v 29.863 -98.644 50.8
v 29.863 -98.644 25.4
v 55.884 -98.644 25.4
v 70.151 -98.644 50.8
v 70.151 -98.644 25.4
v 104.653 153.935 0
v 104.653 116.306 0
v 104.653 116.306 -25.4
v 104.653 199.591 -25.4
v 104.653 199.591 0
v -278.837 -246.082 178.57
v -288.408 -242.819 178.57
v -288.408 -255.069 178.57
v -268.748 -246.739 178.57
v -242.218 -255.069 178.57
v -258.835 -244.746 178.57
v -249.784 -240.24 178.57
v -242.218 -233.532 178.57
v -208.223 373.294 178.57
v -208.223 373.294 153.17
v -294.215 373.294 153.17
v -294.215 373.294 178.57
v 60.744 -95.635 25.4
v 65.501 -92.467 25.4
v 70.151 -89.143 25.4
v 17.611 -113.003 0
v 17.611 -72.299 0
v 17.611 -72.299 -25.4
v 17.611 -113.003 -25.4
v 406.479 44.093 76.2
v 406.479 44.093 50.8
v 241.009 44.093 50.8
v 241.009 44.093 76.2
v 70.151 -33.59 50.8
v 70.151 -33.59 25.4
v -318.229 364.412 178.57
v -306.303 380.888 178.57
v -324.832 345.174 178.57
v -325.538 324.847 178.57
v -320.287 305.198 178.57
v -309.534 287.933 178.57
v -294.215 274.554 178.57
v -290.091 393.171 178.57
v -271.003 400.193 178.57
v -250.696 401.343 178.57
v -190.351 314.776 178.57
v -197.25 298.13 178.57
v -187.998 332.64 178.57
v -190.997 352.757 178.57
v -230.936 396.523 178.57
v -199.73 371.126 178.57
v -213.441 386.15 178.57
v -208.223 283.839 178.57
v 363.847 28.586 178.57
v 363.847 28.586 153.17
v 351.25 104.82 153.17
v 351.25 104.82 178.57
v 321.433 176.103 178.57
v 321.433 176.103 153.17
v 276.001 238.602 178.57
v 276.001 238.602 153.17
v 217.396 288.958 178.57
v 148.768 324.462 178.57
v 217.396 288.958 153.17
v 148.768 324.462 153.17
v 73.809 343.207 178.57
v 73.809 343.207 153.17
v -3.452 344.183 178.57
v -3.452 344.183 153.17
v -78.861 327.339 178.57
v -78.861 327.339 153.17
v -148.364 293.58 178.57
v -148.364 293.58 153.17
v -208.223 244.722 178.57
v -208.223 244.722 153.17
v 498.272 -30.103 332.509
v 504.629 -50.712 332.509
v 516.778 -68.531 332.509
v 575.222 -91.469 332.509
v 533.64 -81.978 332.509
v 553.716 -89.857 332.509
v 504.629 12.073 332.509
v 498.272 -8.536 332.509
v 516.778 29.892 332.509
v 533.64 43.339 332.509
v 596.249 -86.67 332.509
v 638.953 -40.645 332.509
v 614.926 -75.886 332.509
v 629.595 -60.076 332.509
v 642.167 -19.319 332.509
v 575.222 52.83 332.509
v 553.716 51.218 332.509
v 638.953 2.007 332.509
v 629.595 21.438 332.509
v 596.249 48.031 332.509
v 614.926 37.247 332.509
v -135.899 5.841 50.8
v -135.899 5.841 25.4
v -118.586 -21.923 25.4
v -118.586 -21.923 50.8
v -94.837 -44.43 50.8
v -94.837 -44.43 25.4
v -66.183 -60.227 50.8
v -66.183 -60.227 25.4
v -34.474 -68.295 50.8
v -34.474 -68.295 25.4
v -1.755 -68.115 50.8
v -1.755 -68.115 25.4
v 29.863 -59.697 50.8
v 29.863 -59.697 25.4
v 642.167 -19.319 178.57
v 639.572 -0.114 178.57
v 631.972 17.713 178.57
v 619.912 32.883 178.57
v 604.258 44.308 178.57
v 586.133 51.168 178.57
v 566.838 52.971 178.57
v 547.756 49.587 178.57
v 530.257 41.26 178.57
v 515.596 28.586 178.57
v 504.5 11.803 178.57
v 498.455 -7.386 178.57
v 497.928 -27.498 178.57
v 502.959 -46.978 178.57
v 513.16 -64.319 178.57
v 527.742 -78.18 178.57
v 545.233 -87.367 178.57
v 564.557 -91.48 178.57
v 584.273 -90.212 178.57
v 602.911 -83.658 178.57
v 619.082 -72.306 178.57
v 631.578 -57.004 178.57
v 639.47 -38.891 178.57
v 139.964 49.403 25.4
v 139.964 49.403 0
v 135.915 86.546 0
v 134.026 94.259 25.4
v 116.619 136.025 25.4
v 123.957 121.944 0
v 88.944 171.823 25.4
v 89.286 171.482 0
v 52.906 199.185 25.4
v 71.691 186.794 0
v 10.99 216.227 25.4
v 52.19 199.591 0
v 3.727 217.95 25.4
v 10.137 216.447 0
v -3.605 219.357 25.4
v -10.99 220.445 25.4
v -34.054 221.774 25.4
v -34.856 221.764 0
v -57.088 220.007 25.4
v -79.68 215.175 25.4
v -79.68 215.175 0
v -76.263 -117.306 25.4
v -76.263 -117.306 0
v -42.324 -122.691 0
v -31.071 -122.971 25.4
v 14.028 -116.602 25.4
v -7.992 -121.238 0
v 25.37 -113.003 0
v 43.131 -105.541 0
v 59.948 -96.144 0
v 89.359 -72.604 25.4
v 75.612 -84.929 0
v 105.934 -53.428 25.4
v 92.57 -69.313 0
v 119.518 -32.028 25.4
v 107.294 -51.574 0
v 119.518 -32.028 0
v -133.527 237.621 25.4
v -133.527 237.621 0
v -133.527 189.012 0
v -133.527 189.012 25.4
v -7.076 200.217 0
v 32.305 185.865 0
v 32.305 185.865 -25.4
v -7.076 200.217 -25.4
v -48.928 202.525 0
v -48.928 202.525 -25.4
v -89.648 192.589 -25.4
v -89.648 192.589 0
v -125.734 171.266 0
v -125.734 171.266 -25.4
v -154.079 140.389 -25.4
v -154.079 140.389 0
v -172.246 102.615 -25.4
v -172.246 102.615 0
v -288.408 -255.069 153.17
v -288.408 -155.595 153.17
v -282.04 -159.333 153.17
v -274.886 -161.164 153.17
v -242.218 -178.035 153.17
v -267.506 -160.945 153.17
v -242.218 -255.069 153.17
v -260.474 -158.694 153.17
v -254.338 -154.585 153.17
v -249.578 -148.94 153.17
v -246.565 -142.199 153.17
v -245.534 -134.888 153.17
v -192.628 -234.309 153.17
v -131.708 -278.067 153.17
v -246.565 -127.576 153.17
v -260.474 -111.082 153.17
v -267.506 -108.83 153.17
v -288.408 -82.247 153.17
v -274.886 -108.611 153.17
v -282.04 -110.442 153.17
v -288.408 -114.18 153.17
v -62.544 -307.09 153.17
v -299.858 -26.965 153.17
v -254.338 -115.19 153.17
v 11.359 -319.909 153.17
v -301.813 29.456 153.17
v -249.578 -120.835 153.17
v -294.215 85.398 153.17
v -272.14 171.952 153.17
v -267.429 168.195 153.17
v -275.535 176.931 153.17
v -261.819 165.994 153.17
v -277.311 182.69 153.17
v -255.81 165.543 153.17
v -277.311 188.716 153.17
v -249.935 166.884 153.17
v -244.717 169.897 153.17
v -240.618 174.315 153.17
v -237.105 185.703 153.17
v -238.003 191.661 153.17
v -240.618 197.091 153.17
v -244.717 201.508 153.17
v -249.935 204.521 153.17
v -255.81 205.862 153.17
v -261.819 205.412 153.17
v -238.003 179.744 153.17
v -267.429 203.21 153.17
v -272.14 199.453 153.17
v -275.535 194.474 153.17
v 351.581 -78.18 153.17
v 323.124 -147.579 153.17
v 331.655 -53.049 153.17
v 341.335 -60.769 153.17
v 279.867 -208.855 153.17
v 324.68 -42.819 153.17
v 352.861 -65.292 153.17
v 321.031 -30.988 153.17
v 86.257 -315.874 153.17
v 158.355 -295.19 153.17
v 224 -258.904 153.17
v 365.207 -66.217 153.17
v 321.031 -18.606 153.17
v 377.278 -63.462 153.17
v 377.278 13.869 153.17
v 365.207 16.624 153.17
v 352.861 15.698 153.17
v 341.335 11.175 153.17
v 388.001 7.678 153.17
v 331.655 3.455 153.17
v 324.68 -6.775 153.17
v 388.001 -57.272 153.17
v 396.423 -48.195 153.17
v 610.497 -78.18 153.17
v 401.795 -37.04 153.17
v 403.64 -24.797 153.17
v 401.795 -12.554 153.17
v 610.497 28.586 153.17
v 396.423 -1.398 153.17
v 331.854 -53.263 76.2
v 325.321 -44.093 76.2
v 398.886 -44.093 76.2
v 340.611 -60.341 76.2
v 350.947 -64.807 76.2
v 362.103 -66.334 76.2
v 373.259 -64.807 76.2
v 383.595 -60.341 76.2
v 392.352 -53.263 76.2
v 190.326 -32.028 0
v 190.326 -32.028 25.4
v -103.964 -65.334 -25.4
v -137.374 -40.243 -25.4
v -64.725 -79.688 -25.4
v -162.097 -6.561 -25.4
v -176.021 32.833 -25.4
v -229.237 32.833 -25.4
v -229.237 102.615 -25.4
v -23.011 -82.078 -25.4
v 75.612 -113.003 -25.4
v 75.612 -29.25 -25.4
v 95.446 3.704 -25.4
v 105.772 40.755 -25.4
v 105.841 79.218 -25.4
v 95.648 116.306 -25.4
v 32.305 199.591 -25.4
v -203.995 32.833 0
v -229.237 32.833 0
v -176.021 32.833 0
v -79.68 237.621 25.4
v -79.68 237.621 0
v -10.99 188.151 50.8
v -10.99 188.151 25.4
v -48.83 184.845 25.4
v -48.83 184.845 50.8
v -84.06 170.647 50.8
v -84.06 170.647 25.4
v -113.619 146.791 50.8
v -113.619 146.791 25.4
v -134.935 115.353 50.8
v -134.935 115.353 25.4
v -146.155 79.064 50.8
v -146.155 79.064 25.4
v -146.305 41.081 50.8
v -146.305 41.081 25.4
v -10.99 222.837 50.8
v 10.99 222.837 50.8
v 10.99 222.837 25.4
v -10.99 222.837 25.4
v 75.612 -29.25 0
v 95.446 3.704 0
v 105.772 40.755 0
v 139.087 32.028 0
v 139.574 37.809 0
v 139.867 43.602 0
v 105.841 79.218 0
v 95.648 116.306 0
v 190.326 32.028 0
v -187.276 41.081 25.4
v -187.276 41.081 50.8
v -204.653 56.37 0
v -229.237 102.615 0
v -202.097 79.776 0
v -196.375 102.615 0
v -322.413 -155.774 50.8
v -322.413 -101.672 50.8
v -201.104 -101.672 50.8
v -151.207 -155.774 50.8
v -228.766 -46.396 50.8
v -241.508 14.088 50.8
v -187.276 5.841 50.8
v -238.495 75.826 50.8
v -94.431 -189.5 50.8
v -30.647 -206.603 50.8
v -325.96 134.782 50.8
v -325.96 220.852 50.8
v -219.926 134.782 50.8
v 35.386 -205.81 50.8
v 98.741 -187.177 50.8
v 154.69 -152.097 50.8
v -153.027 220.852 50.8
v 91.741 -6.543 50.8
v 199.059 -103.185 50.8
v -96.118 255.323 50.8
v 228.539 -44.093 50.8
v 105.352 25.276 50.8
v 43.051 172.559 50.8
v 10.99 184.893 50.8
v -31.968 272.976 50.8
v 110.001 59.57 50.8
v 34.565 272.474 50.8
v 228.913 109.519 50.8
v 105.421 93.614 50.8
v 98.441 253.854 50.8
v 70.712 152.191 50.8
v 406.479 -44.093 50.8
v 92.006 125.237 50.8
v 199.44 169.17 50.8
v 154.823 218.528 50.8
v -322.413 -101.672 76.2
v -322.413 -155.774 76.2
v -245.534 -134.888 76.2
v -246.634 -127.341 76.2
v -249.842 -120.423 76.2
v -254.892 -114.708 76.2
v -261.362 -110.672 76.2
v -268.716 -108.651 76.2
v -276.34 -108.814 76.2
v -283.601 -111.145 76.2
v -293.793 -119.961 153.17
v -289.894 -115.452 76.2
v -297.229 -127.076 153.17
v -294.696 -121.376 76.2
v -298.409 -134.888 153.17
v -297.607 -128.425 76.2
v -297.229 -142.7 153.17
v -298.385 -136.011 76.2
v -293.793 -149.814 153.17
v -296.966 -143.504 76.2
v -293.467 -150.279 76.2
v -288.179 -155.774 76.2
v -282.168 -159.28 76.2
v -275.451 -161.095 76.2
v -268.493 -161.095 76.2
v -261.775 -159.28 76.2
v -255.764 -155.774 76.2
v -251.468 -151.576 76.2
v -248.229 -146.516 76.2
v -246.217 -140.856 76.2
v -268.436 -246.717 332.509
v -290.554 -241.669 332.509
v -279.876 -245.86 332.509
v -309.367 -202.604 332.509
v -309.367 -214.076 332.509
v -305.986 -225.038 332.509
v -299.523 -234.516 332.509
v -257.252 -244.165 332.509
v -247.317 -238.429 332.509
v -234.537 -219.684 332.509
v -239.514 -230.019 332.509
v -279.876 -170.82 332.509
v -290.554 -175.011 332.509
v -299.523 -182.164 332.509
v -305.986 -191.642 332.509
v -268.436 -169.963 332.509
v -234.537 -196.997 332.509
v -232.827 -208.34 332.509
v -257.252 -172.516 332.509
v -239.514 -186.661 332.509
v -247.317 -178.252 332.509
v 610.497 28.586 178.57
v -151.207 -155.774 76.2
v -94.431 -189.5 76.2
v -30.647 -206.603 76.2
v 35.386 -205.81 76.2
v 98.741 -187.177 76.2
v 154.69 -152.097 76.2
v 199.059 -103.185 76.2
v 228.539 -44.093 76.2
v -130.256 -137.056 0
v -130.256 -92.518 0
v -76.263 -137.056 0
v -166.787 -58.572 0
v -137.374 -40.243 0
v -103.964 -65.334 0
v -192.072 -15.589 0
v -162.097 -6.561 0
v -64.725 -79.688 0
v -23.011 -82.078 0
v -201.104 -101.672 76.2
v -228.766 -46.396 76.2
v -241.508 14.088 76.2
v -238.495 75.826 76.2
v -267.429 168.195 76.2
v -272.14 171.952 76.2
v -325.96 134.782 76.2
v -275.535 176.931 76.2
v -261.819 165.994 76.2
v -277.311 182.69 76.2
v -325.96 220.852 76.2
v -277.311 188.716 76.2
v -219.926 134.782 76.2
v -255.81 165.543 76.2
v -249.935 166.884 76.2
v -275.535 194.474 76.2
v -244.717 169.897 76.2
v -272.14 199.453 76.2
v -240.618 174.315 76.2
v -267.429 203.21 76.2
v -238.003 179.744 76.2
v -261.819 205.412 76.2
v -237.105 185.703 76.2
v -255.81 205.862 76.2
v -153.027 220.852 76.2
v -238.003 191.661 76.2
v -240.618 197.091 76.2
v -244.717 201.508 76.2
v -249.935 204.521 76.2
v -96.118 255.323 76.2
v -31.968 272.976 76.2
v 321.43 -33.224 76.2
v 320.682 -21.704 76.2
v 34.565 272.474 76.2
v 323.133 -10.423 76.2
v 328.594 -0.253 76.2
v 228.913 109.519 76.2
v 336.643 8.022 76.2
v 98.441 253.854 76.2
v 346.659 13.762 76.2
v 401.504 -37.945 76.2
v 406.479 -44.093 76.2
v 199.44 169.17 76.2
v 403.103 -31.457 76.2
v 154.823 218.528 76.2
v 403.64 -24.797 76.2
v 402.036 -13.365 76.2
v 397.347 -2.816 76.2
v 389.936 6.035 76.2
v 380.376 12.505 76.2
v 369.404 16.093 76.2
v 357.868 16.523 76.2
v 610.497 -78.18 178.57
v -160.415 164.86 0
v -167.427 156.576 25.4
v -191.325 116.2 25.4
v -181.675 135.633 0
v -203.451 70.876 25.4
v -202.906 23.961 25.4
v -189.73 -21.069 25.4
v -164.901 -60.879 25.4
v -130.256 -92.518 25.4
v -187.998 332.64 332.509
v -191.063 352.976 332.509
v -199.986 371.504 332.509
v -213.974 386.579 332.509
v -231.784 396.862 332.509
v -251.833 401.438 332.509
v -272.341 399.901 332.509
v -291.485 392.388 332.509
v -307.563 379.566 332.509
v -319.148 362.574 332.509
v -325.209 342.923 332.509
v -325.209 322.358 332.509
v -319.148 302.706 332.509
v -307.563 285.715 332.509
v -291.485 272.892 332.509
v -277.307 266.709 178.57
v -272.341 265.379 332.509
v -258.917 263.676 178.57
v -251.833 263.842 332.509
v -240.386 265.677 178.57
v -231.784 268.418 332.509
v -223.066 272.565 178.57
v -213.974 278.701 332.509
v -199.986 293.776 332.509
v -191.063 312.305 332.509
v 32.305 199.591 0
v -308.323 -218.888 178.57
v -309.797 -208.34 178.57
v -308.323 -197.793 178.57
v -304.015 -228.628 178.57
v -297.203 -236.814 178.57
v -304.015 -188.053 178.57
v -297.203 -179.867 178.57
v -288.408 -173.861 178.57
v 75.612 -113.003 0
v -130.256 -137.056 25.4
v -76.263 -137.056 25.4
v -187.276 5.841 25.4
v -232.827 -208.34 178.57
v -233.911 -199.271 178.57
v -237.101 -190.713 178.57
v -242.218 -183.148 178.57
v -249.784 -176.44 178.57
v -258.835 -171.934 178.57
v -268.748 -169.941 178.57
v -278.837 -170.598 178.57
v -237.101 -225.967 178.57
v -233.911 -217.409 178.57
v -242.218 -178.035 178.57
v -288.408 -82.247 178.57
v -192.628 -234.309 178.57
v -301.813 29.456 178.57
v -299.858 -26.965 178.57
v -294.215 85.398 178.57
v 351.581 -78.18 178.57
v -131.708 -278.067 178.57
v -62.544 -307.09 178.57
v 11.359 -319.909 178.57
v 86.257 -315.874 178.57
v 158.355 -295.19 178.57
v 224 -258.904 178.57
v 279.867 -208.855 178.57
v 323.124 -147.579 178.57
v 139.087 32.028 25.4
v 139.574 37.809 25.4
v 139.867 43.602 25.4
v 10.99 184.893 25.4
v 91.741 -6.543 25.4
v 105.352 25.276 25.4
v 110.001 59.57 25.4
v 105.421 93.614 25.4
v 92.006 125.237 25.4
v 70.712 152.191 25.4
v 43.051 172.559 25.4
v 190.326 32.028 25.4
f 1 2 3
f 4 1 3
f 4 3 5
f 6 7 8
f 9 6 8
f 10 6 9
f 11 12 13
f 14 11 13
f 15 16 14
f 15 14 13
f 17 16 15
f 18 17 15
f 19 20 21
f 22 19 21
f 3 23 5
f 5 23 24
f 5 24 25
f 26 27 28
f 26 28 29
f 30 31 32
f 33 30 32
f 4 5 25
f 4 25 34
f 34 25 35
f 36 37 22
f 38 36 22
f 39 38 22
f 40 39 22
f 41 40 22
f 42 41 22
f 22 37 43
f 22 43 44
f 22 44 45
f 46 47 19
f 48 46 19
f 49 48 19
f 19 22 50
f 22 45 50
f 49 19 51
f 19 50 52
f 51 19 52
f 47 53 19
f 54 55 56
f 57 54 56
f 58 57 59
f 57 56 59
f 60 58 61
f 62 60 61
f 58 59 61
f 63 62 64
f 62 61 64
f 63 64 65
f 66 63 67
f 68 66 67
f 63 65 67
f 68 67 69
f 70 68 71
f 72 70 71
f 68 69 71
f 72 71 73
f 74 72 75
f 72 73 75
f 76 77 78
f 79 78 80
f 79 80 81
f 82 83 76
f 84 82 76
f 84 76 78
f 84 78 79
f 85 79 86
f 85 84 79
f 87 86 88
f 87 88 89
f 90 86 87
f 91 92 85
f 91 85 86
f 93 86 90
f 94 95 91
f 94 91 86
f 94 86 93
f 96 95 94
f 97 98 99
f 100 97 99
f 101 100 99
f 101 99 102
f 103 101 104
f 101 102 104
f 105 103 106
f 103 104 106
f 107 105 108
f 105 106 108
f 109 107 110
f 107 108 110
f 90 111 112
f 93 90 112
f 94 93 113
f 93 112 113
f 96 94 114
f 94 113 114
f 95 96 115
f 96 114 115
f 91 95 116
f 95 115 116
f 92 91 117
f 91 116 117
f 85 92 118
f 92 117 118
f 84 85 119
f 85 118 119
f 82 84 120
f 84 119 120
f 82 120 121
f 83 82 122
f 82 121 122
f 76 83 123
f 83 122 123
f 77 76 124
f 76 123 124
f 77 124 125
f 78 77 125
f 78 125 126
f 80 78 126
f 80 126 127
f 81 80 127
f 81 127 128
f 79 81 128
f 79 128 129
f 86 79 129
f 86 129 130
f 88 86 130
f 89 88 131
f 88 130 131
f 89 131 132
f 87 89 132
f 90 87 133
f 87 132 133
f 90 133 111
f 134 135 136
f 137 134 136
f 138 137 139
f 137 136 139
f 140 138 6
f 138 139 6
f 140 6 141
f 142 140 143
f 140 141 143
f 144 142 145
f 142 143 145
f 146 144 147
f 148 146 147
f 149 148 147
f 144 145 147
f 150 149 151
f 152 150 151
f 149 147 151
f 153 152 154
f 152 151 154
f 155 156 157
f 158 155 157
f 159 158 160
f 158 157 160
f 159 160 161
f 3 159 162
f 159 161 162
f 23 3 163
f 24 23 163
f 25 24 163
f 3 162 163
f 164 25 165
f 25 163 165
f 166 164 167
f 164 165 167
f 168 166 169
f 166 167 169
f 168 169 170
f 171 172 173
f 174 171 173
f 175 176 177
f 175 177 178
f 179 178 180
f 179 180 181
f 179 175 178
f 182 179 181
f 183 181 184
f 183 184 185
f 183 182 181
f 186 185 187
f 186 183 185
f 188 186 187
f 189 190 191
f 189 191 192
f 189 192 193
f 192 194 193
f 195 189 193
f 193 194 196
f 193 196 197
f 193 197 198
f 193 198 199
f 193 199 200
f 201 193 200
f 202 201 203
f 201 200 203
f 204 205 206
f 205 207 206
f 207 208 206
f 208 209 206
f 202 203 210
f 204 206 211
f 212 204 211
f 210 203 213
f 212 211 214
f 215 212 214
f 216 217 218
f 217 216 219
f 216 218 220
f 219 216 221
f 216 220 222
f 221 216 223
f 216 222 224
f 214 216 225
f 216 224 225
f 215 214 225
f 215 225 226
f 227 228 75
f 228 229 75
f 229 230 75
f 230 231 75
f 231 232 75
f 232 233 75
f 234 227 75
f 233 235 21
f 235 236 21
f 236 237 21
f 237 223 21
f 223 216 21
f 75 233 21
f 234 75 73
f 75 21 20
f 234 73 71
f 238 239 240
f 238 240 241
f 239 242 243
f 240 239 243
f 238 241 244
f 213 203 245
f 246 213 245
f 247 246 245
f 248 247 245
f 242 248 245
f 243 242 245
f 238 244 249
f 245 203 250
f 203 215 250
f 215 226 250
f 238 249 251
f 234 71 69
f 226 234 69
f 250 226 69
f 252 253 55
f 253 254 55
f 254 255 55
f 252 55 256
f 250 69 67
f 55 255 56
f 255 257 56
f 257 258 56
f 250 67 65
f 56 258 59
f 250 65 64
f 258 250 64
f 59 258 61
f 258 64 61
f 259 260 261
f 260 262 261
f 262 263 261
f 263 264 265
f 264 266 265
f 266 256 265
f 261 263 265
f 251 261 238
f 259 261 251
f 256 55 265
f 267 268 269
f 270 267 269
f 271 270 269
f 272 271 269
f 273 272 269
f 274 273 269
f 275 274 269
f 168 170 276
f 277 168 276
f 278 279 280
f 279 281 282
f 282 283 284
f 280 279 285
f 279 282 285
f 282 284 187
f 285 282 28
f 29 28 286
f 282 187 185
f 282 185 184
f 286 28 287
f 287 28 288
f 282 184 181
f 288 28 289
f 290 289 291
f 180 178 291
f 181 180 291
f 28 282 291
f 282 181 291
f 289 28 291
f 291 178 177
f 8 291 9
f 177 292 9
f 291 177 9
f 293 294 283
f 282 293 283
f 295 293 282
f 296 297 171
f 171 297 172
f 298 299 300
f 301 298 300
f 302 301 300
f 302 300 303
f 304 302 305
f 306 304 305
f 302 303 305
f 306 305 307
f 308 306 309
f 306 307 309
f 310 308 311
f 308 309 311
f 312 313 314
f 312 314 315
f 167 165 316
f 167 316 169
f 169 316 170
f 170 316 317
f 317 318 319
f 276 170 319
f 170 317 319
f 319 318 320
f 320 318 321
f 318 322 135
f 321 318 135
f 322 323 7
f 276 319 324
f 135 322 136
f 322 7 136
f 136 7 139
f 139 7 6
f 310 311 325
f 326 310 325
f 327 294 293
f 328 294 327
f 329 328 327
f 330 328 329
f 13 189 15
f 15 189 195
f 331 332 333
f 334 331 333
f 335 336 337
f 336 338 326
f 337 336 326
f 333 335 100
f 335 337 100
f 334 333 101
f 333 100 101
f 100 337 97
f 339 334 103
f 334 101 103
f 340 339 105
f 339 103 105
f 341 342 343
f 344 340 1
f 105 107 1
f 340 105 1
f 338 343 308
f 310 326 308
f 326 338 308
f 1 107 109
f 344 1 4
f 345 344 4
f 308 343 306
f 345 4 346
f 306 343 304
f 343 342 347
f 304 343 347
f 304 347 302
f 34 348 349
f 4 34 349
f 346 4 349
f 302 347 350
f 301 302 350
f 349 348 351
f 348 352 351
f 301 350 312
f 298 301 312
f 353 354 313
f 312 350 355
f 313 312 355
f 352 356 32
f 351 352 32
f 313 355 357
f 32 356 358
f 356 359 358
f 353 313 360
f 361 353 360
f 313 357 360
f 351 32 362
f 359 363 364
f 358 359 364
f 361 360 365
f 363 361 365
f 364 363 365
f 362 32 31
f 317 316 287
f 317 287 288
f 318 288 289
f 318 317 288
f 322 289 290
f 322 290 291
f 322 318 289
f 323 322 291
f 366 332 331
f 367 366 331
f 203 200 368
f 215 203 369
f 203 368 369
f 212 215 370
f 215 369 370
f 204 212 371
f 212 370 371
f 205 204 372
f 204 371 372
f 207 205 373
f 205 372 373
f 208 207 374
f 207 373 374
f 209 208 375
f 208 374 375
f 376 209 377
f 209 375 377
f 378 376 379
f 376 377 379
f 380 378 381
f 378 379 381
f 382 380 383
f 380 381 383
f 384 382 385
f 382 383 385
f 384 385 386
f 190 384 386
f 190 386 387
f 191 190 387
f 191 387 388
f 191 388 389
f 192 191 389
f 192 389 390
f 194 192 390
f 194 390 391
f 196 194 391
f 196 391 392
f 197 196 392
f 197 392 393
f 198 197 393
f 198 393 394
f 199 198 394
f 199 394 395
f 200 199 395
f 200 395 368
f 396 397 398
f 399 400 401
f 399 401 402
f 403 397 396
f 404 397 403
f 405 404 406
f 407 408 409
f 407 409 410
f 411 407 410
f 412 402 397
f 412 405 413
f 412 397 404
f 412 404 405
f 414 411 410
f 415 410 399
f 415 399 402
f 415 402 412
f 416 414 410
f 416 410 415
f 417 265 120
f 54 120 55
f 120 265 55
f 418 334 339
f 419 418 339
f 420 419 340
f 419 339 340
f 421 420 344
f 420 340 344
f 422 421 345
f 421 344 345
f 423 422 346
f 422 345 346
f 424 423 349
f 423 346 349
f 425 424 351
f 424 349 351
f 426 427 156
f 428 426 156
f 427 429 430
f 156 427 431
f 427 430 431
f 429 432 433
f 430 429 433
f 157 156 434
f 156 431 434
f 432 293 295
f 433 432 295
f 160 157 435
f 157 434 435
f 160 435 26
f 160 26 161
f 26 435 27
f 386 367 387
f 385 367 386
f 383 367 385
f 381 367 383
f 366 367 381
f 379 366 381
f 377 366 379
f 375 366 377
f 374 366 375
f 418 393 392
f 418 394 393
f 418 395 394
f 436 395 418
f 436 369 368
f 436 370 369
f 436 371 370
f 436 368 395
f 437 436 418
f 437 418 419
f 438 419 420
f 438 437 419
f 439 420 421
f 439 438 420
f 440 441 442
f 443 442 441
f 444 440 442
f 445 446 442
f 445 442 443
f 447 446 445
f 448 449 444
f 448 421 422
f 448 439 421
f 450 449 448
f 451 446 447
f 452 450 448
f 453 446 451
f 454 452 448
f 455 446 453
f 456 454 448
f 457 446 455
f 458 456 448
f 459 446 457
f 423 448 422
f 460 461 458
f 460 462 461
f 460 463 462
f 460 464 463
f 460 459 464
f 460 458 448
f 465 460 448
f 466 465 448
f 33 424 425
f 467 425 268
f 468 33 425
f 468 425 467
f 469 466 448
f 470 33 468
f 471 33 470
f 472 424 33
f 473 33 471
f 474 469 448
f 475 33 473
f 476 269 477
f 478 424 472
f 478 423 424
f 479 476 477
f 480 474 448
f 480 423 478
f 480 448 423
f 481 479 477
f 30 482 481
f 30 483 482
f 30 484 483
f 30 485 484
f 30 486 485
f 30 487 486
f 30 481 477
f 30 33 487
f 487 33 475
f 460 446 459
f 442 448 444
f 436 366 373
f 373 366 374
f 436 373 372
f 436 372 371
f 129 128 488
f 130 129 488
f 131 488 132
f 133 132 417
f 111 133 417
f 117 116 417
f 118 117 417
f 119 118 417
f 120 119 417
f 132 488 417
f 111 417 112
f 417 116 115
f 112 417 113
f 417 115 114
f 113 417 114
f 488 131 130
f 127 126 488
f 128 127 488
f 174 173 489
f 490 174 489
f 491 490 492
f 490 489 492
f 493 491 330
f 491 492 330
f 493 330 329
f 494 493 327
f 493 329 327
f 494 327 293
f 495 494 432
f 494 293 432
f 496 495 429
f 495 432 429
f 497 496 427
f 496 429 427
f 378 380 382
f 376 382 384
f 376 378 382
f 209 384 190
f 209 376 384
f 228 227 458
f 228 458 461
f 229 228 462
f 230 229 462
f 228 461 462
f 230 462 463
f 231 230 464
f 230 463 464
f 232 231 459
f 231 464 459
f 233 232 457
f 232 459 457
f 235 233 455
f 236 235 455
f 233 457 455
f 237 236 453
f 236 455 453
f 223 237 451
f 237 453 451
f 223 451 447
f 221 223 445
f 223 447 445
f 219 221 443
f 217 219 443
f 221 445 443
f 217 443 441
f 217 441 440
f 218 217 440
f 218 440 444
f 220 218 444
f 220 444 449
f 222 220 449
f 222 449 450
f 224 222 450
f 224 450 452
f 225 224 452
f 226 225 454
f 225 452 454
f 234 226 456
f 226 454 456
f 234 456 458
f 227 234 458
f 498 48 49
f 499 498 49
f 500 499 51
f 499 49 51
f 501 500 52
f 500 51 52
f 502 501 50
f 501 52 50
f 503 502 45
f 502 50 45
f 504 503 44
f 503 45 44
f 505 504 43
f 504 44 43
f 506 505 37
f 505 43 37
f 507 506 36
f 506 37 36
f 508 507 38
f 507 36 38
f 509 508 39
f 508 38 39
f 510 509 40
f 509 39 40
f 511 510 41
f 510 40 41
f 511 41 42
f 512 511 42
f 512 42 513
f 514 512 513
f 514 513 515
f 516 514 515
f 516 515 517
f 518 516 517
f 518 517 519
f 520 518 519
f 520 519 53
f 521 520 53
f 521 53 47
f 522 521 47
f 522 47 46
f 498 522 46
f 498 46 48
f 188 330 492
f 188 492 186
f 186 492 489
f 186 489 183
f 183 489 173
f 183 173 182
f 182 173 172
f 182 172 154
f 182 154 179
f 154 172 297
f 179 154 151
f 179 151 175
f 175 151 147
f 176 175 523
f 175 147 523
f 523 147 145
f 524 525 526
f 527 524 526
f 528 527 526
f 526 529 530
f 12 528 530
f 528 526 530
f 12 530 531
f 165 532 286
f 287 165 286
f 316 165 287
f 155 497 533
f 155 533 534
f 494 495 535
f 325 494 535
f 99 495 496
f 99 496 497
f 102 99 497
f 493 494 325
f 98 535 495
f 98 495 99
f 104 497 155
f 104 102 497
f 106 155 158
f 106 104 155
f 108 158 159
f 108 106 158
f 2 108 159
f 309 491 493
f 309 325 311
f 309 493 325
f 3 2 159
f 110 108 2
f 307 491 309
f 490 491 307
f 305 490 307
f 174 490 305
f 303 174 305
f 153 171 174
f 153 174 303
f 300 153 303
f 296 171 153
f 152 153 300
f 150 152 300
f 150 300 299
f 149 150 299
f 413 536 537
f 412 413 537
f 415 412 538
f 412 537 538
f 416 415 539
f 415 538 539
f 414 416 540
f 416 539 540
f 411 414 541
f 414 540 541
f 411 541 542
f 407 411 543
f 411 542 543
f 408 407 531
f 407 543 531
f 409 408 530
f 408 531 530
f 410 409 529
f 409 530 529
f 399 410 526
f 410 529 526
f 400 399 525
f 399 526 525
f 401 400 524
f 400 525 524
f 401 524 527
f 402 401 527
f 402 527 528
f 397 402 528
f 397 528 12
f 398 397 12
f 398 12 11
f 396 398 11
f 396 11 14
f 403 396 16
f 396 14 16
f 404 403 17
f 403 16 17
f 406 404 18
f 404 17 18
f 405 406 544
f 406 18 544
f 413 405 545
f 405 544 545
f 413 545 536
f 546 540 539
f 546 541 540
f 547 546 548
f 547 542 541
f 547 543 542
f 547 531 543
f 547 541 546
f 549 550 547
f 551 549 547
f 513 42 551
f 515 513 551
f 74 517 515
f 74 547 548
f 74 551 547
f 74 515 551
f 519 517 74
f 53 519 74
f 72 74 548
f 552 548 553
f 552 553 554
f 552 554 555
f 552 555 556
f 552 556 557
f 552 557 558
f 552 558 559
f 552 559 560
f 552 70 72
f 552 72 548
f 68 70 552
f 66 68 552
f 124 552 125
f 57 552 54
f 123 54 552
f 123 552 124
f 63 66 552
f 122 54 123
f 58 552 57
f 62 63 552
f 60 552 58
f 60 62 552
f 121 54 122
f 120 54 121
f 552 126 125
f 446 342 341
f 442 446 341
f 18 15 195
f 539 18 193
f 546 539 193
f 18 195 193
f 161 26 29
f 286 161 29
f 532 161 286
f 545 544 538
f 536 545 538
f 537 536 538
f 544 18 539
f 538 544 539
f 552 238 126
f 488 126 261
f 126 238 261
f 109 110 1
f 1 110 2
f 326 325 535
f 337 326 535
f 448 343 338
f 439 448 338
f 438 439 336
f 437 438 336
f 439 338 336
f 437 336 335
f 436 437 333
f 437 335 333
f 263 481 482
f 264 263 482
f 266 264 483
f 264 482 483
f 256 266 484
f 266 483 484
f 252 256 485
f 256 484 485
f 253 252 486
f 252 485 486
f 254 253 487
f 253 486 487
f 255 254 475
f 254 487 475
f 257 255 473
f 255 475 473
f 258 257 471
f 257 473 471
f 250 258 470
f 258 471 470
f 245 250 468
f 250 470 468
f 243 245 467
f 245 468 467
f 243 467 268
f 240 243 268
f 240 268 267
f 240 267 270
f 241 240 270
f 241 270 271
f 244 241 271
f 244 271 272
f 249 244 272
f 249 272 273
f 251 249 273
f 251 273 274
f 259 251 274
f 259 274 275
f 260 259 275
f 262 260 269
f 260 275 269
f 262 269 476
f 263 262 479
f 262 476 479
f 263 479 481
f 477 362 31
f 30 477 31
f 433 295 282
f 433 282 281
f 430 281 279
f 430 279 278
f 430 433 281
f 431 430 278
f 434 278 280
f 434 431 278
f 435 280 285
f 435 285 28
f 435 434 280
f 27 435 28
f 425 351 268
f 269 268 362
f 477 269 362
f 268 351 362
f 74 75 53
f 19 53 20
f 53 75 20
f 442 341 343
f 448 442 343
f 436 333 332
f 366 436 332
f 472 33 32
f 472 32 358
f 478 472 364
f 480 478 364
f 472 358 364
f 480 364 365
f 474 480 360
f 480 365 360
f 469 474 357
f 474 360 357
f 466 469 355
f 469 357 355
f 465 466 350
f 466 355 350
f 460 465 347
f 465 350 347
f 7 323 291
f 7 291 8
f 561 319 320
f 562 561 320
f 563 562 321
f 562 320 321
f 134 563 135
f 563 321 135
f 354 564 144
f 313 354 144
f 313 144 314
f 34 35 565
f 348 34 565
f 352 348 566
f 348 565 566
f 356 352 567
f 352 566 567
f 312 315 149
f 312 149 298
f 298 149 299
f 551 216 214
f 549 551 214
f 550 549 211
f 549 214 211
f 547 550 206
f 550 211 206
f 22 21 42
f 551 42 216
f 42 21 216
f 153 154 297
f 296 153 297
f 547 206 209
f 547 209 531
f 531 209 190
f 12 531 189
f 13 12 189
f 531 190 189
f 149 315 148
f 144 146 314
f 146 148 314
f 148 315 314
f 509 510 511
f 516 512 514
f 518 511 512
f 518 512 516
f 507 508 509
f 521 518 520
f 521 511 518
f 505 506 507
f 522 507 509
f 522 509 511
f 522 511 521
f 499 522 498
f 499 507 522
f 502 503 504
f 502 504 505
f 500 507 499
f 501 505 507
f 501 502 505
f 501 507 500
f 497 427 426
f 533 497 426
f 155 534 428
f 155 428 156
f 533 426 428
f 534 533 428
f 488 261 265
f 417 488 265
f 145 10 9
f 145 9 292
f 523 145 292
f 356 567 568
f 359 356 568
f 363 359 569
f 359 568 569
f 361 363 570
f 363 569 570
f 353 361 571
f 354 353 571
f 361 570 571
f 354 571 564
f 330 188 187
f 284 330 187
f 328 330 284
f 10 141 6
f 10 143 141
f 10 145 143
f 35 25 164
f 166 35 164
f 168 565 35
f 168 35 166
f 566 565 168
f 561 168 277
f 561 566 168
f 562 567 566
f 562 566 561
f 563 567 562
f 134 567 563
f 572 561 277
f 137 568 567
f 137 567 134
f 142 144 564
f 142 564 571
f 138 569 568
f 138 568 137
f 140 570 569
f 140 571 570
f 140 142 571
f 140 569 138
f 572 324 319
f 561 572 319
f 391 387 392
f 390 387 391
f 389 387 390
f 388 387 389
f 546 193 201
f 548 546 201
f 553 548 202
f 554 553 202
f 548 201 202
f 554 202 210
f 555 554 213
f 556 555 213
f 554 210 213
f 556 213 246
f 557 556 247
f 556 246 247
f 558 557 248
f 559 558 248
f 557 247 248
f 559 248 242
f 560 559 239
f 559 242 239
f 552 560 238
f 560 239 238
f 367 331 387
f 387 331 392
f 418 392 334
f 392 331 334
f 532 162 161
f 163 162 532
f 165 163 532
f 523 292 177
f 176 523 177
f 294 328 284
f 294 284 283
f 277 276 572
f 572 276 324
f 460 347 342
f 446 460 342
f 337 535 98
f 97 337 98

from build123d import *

# Parameters (mm, degrees)
F1_DEPTH  = 25.4
F3_DEPTH  = 25.4
F5_DEPTH  = 25.4
F7_DEPTH  = 25.4
F8_R      = 26.4374178828
F8_R_2    = 20.2158541238
F8_R_3    = 41.5366854277
F9_DEPTH  = 76.96962
F11_DEPTH = 25.4
F12_R     = 38.48481
F12_R_2   = 68.9908119852
F12_R_3   = 72.3516487383
F13_DEPTH = 153.93924


with BuildPart() as f1:
    # F0 (on Top) → F1 (new body)
    with BuildSketch(Plane.XY):
        with BuildLine():
            ThreePointArc((139.0866722242, 32.0284068584), (139.7448851035, 40.7043758766), (139.9644758853, 49.4025057036))
            ThreePointArc((139.9644758853, 49.4025057036), (71.4291716272, 186.9925042301), (-79.6795263886, 215.1750699089))
            Line((-79.6795263886, 215.1750699089), (-79.6795263886, 172.3793298006))
            Line((-79.6795263886, 172.3793298006), (-133.5268542171, 172.3793298006))
            Line((-133.5268542171, 172.3793298006), (-133.5268542171, 189.0120366332))
            ThreePointArc((-133.526854217, 189.0120366332), (-204.7819093266, 47.399960627), (-130.2560642362, -92.5184490373))
            Line((-130.2560642362, -92.5184490373), (-130.2560642362, -78.4356147051))
            Line((-130.2560642362, -78.4356147051), (-76.262794435, -78.4356147051))
            Line((-76.262794435, -78.4356147051), (-76.262794435, -117.3063801224))
            ThreePointArc((-76.262794435, -117.3063801224), (36.4232602358, -108.6350876024), (119.518113847, -32.0284068584))
            Line((119.518113847, -32.0284068584), (75.1415789127, -32.0284068584))
            Line((75.1415789127, -32.0284068584), (75.1415789127, 32.0284068584))
            Line((75.1415789127, 32.0284068584), (139.0866722242, 32.0284068584))
        make_face()
        with BuildLine():
            Line((-79.6795263886, 172.3793298006), (-79.6795263886, 215.1750699089))
            ThreePointArc((-79.6795263886, 215.1750699089), (-107.7476794206, 204.4490783385), (-133.526854217, 189.0120366332))
            Line((-133.5268542171, 189.0120366332), (-133.5268542171, 172.3793298006))
            Line((-133.5268542171, 172.3793298006), (-79.6795263886, 172.3793298006))
        make_face()
        with BuildLine():
            ThreePointArc((-133.526854217, 189.0120366332), (-107.7476794206, 204.4490783385), (-79.6795263886, 215.1750699089))
            Line((-79.6795263886, 215.1750699089), (-79.6795263886, 237.6205772161))
            Line((-79.6795263886, 237.6205772161), (-133.5268542171, 237.6205772161))
            Line((-133.5268542171, 237.6205772161), (-133.5268542171, 189.0120366332))
        make_face()
        with BuildLine():
            Line((190.3256773949, 32.0284068584), (139.0866722242, 32.0284068584))
            ThreePointArc((139.0866722242, 32.0284068584), (132.4435362995, -0.9595801253), (119.518113847, -32.0284068584))
            Line((119.518113847, -32.0284068584), (190.3256773949, -32.0284068584))
            Line((190.3256773949, -32.0284068584), (190.3256773949, 32.0284068584))
        make_face()
        with BuildLine():
            ThreePointArc((119.518113847, -32.0284068584), (132.4435362995, -0.9595801253), (139.0866722242, 32.0284068584))
            Line((139.0866722242, 32.0284068584), (75.1415789127, 32.0284068584))
            Line((75.1415789127, 32.0284068584), (75.1415789127, -32.0284068584))
            Line((75.1415789127, -32.0284068584), (119.518113847, -32.0284068584))
        make_face()
        with BuildLine():
            Line((-130.2560642362, -78.4356147051), (-130.2560642362, -92.5184490373))
            ThreePointArc((-130.2560642362, -92.5184490373), (-104.3353903251, -107.2560814152), (-76.262794435, -117.3063801224))
            Line((-76.262794435, -117.3063801224), (-76.262794435, -78.4356147051))
            Line((-76.262794435, -78.4356147051), (-130.2560642362, -78.4356147051))
        make_face()
        with BuildLine():
            ThreePointArc((-76.262794435, -117.3063801224), (-104.3353903251, -107.2560814152), (-130.2560642362, -92.5184490373))
            Line((-130.2560642362, -92.5184490373), (-130.2560642362, -137.0555609465))
            Line((-130.2560642362, -137.0555609465), (-76.262794435, -137.0555609465))
            Line((-76.262794435, -137.0555609465), (-76.262794435, -117.3063801224))
        make_face()
    extrude(amount=F1_DEPTH)

    # F2 (on Top) → F3 (join)
    with BuildSketch(Plane.XY):
        with BuildLine():
            ThreePointArc((75.6118036807, -29.2504710738), (99.0030626057, 12.8049370358), (107.1065195267, 60.2406022181))
            ThreePointArc((107.1065195267, 60.2406022181), (104.2125651571, 88.852840411), (95.6479245708, 116.3061112165))
            Line((95.6479245708, 116.3061112165), (32.3053076863, 116.3061112165))
            Line((32.3053076863, 116.3061112165), (32.3053076863, 185.8650083866))
            ThreePointArc((32.3053076863, 185.8650083866), (-89.6480521885, 192.5894553657), (-172.2460990224, 102.6149988174))
            Line((-172.2460990224, 102.6149988174), (-127.7187615633, 102.6149988174))
            Line((-127.7187615633, 102.6149988174), (-127.7187615633, 32.8334420919))
            Line((-127.7187615633, 32.8334420919), (-176.0207239306, 32.8334420919))
            ThreePointArc((-176.0207239306, 32.8334420919), (-103.9642758165, -65.3340546547), (17.6107399166, -72.2985849202))
            Line((17.6107399166, -72.2985849202), (17.6107399166, 0))
            Line((17.6107399166, 0), (75.6118036807, 0))
            Line((75.6118036807, 0), (75.6118036807, -29.2504710738))
        make_face()
        with BuildLine():
            Line((32.3053076863, 116.3061112165), (95.6479245708, 116.3061112165))
            ThreePointArc((95.6479245708, 116.3061112165), (69.8653962579, 156.4480764432), (32.3053076863, 185.8650083866))
            Line((32.3053076863, 185.8650083866), (32.3053076863, 116.3061112165))
        make_face()
        with BuildLine():
            ThreePointArc((32.3053076863, 185.8650083866), (69.8653962579, 156.4480764432), (95.6479245708, 116.3061112165))
            Line((95.6479245708, 116.3061112165), (104.6530529857, 116.3061112165))
            Line((104.6530529857, 116.3061112165), (104.6530529857, 199.5911747217))
            Line((104.6530529857, 199.5911747217), (32.3053076863, 199.5911747217))
            Line((32.3053076863, 199.5911747217), (32.3053076863, 185.8650083866))
        make_face()
        with BuildLine():
            Line((75.6118036807, -113.002628088), (75.6118036807, -29.2504710738))
            ThreePointArc((75.6118036807, -29.2504710738), (49.3762482748, -54.4999311), (17.6107399166, -72.2985849202))
            Line((17.6107399166, -72.2985849202), (17.6107399166, -113.002628088))
            Line((17.6107399166, -113.002628088), (75.6118036807, -113.002628088))
        make_face()
        with BuildLine():
            ThreePointArc((17.6107399166, -72.2985849202), (49.3762482748, -54.4999311), (75.6118036807, -29.2504710738))
            Line((75.6118036807, -29.2504710738), (75.6118036807, 0))
            Line((75.6118036807, 0), (17.6107399166, 0))
            Line((17.6107399166, 0), (17.6107399166, -72.2985849202))
        make_face()
        with BuildLine():
            Line((-127.7187615633, 102.6149988174), (-172.2460990224, 102.6149988174))
            ThreePointArc((-172.2460990224, 102.6149988174), (-178.4651931082, 67.9585352452), (-176.0207239306, 32.8334420919))
            Line((-176.0207239306, 32.8334420919), (-127.7187615633, 32.8334420919))
            Line((-127.7187615633, 32.8334420919), (-127.7187615633, 102.6149988174))
        make_face()
        with BuildLine():
            ThreePointArc((-176.0207239306, 32.8334420919), (-178.4651931082, 67.9585352452), (-172.2460990224, 102.6149988174))
            Line((-172.2460990224, 102.6149988174), (-229.236587882, 102.6149988174))
            Line((-229.236587882, 102.6149988174), (-229.236587882, 32.8334420919))
            Line((-229.236587882, 32.8334420919), (-176.0207239306, 32.8334420919))
        make_face()
    extrude(amount=-F3_DEPTH)

    # F4 (on face) → F5 (join)
    with BuildSketch(Plane.XY.offset(25.4)):
        with BuildLine():
            ThreePointArc((70.1512694359, -33.5902639723), (99.6199988318, 8.9072537868), (110.0005673225, 59.5697529918))
            ThreePointArc((110.0005673225, 59.5697529918), (82.2613910369, 139.427420647), (10.990194045, 184.8930721179))
            Line((10.990194045, 184.8930721179), (10.990194045, 151.1777639389))
            Line((10.990194045, 151.1777639389), (-10.990194045, 151.1777639389))
            Line((-10.990194045, 151.1777639389), (-10.990194045, 188.1514055076))
            ThreePointArc((-10.990194045, 188.1514055076), (-113.6185061509, 146.791471362), (-146.3052292726, 41.0805791616))
            Line((-146.3052292726, 41.0805791616), (-97.673587501, 41.0805791616))
            Line((-97.673587501, 41.0805791616), (-97.673587501, 5.8405236105))
            Line((-97.673587501, 5.8405236105), (-135.899116833, 5.8405236105))
            ThreePointArc((-135.899116833, 5.8405236105), (-66.1831399884, -60.2267115252), (29.8632881141, -59.6969619413))
            Line((29.8632881141, -59.6969619413), (29.8632881141, 0))
            Line((29.8632881141, 0), (70.1512694359, 0))
            Line((70.1512694359, 0), (70.1512694359, -33.5902639723))
        make_face()
        with BuildLine():
            Line((10.990194045, 151.1777639389), (10.990194045, 184.8930721179))
            ThreePointArc((10.990194045, 184.8930721179), (0.070386323, 186.9970578415), (-10.990194045, 188.1514055076))
            Line((-10.990194045, 188.1514055076), (-10.990194045, 151.1777639389))
            Line((-10.990194045, 151.1777639389), (10.990194045, 151.1777639389))
        make_face()
        with BuildLine():
            ThreePointArc((-10.990194045, 188.1514055076), (0.070386323, 186.9970578415), (10.990194045, 184.8930721179))
            Line((10.990194045, 184.8930721179), (10.990194045, 222.8371798992))
            Line((10.990194045, 222.8371798992), (-10.990194045, 222.8371798992))
            Line((-10.990194045, 222.8371798992), (-10.990194045, 188.1514055076))
        make_face()
        with BuildLine():
            Line((70.1512694359, -98.6443261582), (70.1512694359, -33.5902639723))
            ThreePointArc((70.1512694359, -33.5902639723), (51.2341659256, -48.5369510828), (29.8632881141, -59.6969619413))
            Line((29.8632881141, -59.6969619413), (29.8632881141, -98.6443261582))
            Line((29.8632881141, -98.6443261582), (70.1512694359, -98.6443261582))
        make_face()
        with BuildLine():
            ThreePointArc((29.8632881141, -59.6969619413), (51.2341659256, -48.5369510828), (70.1512694359, -33.5902639723))
            Line((70.1512694359, -33.5902639723), (70.1512694359, 0))
            Line((70.1512694359, 0), (29.8632881141, 0))
            Line((29.8632881141, 0), (29.8632881141, -59.6969619413))
        make_face()
        with BuildLine():
            Line((-97.673587501, 41.0805791616), (-146.3052292726, 41.0805791616))
            ThreePointArc((-146.3052292726, 41.0805791616), (-142.3651060466, 23.087617163), (-135.899116833, 5.8405236105))
            Line((-135.899116833, 5.8405236105), (-97.673587501, 5.8405236105))
            Line((-97.673587501, 5.8405236105), (-97.673587501, 41.0805791616))
        make_face()
        with BuildLine():
            ThreePointArc((-135.899116833, 5.8405236105), (-142.3651060466, 23.087617163), (-146.3052292726, 41.0805791616))
            Line((-146.3052292726, 41.0805791616), (-187.2756508942, 41.0805791616))
            Line((-187.2756508942, 41.0805791616), (-187.2756508942, 5.8405236105))
            Line((-187.2756508942, 5.8405236105), (-135.899116833, 5.8405236105))
        make_face()
    extrude(amount=F5_DEPTH)

    # F6 (on face) → F7 (join)
    with BuildSketch(Plane.XY.offset(50.8)):
        with BuildLine():
            ThreePointArc((228.5385191266, -44.0925620496), (238.0517383383, -5.9294068545), (241.2510363332, 33.27125955))
            ThreePointArc((241.2510363332, 33.27125955), (241.1904526245, 38.6832670159), (241.0087318622, 44.0925620496))
            Line((241.0087318622, 44.0925620496), (71.4222490788, 44.0925620496))
            Line((71.4222490788, 44.0925620496), (71.4222490788, -44.0925620496))
            Line((71.4222490788, -44.0925620496), (228.5385191266, -44.0925620496))
        make_face()
        with BuildLine():
            ThreePointArc((241.0087318622, 44.0925620496), (241.1904526245, 38.6832670159), (241.2510363332, 33.27125955))
            ThreePointArc((241.2510363332, 33.27125955), (238.0517383383, -5.9294068545), (228.5385191266, -44.0925620496))
            Line((228.5385191266, -44.0925620496), (406.4791202545, -44.0925620496))
            Line((406.4791202545, -44.0925620496), (406.4791202545, 44.0925620496))
            Line((406.4791202545, 44.0925620496), (241.0087318622, 44.0925620496))
        make_face()
        with BuildLine():
            Line((71.4222490788, 44.0925620496), (241.0087318622, 44.0925620496))
            ThreePointArc((241.0087318622, 44.0925620496), (98.4413229505, 253.8543066571), (-153.0269761889, 220.8520323038))
            Line((-153.0269761889, 220.8520323038), (-62.6387745142, 220.8520323038))
            Line((-62.6387745142, 220.8520323038), (-62.6387745142, 134.7823292017))
            Line((-62.6387745142, 134.7823292017), (-219.9260547186, 134.7823292017))
            ThreePointArc((-219.9260547186, 134.7823292017), (-241.5076828609, 14.0880388149), (-201.1044976944, -101.672321558))
            Line((-201.1044976944, -101.672321558), (-37.5261008739, -101.672321558))
            Line((-37.5261008739, -101.672321558), (-37.5261008739, -155.774474144))
            Line((-37.5261008739, -155.774474144), (-151.2073352892, -155.774474144))
            ThreePointArc((-151.2073352892, -155.774474144), (67.7026866989, -198.6667521566), (228.5385191266, -44.0925620496))
            Line((228.5385191266, -44.0925620496), (71.4222490788, -44.0925620496))
            Line((71.4222490788, -44.0925620496), (71.4222490788, 44.0925620496))
        make_face()
        with BuildLine():
            Line((-62.6387745142, 220.8520323038), (-153.0269761889, 220.8520323038))
            ThreePointArc((-153.0269761889, 220.8520323038), (-191.3909525036, 181.6370069899), (-219.9260547186, 134.7823292017))
            Line((-219.9260547186, 134.7823292017), (-62.6387745142, 134.7823292017))
            Line((-62.6387745142, 134.7823292017), (-62.6387745142, 220.8520323038))
        make_face()
        with BuildLine():
            ThreePointArc((-219.9260547186, 134.7823292017), (-191.3909525036, 181.6370069899), (-153.0269761889, 220.8520323038))
            Line((-153.0269761889, 220.8520323038), (-325.9604126215, 220.8520323038))
            Line((-325.9604126215, 220.8520323038), (-325.9604126215, 134.7823292017))
            Line((-325.9604126215, 134.7823292017), (-219.9260547186, 134.7823292017))
        make_face()
        with BuildLine():
            Line((-322.412699461, -155.774474144), (-151.2073352892, -155.774474144))
            ThreePointArc((-151.2073352892, -155.774474144), (-178.2267591423, -130.6332880699), (-201.1044976944, -101.672321558))
            Line((-201.1044976944, -101.672321558), (-322.412699461, -101.672321558))
            Line((-322.412699461, -101.672321558), (-322.412699461, -155.774474144))
        make_face()
        with BuildLine():
            ThreePointArc((-201.1044976944, -101.672321558), (-178.2267591423, -130.6332880699), (-151.2073352892, -155.774474144))
            Line((-151.2073352892, -155.774474144), (-37.5261008739, -155.774474144))
            Line((-37.5261008739, -155.774474144), (-37.5261008739, -101.672321558))
            Line((-37.5261008739, -101.672321558), (-201.1044976944, -101.672321558))
        make_face()
    extrude(amount=F7_DEPTH)

    # F8 (on face) → F9 (join)
    with BuildSketch(Plane.XY.offset(76.2)):
        with Locations((-271.9717621803, -134.8876059055)):
            Circle(F8_R)
        with Locations((-257.3208808899, 185.7025772333)):
            Circle(F8_R_2)
        with Locations((362.1033132076, -24.7969031334)):
            Circle(F8_R_3)
    extrude(amount=F9_DEPTH)

    # F10 (on face) → F11 (join)
    with BuildSketch(Plane.XY.offset(153.16962)):
        with BuildLine():
            ThreePointArc((351.5808124195, -78.1800076366), (361.048264133, -33.157434081), (364.2242616474, 12.7400365607))
            ThreePointArc((364.2242616474, 12.7400365607), (364.1300024852, 20.6653607746), (363.8472783241, 28.5862013698))
            Line((363.8472783241, 28.5862013698), (113.7096881866, 28.5862013698))
            Line((113.7096881866, 28.5862013698), (113.7096881866, -78.1800076365))
            Line((113.7096881866, -78.1800076365), (351.5808124195, -78.1800076365))
        make_face()
        with BuildLine():
            ThreePointArc((363.8472783241, 28.5862013698), (364.1300024852, 20.6653607746), (364.2242616474, 12.7400365607))
            ThreePointArc((364.2242616474, 12.7400365607), (361.048264133, -33.157434081), (351.5808124195, -78.1800076366))
            Line((351.5808124195, -78.1800076365), (610.4969382286, -78.1800076365))
            Line((610.4969382286, -78.1800076365), (610.4969382286, 28.5862013698))
            Line((610.4969382286, 28.5862013698), (363.8472783241, 28.5862013698))
        make_face()
        with BuildLine():
            Line((113.7096881866, 28.5862013698), (363.8472783241, 28.5862013698))
            ThreePointArc((363.8472783241, 28.5862013698), (148.7684632838, 324.4622780693), (-208.2230746746, 244.7215026257))
            Line((-208.2230746746, 244.7215026257), (-208.2230746746, 6.5638124943))
            Line((-208.2230746746, 6.5638124943), (-294.2146956921, 6.5638124943))
            Line((-294.2146956921, 6.5638124943), (-294.2146956921, 85.3980265007))
            ThreePointArc((-294.2146956921, 85.3980265007), (-302.0326858138, 1.204189161), (-288.4076088667, -82.2468773015))
            Line((-288.4076088667, -82.2468773015), (-288.4076088667, -24.3580341339))
            Line((-288.4076088667, -24.3580341339), (-242.2183901072, -24.3580341339))
            Line((-242.2183901072, -24.3580341339), (-242.2183901072, -178.0348799858))
            ThreePointArc((-242.2183901071, -178.0348799858), (86.256592107, -315.8743057274), (351.5808124195, -78.1800076366))
            Line((351.5808124195, -78.1800076365), (113.7096881866, -78.1800076365))
            Line((113.7096881866, -78.1800076365), (113.7096881866, 28.5862013698))
        make_face()
        with BuildLine():
            Line((-208.2230746746, 6.5638124943), (-208.2230746746, 244.7215026257))
            ThreePointArc((-208.2230746746, 244.7215026257), (-262.2466225859, 171.0117625893), (-294.2146956921, 85.3980265007))
            Line((-294.2146956921, 85.3980265007), (-294.2146956921, 6.5638124943))
            Line((-294.2146956921, 6.5638124943), (-208.2230746746, 6.5638124943))
        make_face()
        with BuildLine():
            ThreePointArc((-294.2146956921, 85.3980265007), (-262.2466225859, 171.0117625893), (-208.2230746746, 244.7215026257))
            Line((-208.2230746746, 244.7215026257), (-208.2230746746, 373.2942044735))
            Line((-208.2230746746, 373.2942044735), (-294.2146956921, 373.2942044735))
            Line((-294.2146956921, 373.2942044735), (-294.2146956921, 85.3980265007))
        make_face()
        with BuildLine():
            Line((-242.2183901072, -255.0694346428), (-242.2183901072, -178.0348799858))
            ThreePointArc((-242.2183901071, -178.0348799858), (-269.1587253652, -131.9952974529), (-288.4076088667, -82.2468773015))
            Line((-288.4076088667, -82.2468773015), (-288.4076088667, -255.0694346428))
            Line((-288.4076088667, -255.0694346428), (-242.2183901072, -255.0694346428))
        make_face()
        with BuildLine():
            ThreePointArc((-288.4076088667, -82.2468773015), (-269.1587253652, -131.9952974529), (-242.2183901071, -178.0348799858))
            Line((-242.2183901072, -178.0348799858), (-242.2183901072, -24.3580341339))
            Line((-242.2183901072, -24.3580341339), (-288.4076088667, -24.3580341339))
            Line((-288.4076088667, -24.3580341339), (-288.4076088667, -82.2468773015))
        make_face()
    extrude(amount=F11_DEPTH)

    # F12 (on face) → F13 (join)
    with BuildSketch(Plane.XY.offset(178.56962)):
        with Locations((-271.3119983673, -208.3401530981)):
            Circle(F12_R)
        with Locations((-256.9891810417, 332.640171051)):
            Circle(F12_R_2)
        with Locations((569.8156356812, -19.3193554878)):
            Circle(F12_R_3)
    extrude(amount=F13_DEPTH)


solid = f1.part
